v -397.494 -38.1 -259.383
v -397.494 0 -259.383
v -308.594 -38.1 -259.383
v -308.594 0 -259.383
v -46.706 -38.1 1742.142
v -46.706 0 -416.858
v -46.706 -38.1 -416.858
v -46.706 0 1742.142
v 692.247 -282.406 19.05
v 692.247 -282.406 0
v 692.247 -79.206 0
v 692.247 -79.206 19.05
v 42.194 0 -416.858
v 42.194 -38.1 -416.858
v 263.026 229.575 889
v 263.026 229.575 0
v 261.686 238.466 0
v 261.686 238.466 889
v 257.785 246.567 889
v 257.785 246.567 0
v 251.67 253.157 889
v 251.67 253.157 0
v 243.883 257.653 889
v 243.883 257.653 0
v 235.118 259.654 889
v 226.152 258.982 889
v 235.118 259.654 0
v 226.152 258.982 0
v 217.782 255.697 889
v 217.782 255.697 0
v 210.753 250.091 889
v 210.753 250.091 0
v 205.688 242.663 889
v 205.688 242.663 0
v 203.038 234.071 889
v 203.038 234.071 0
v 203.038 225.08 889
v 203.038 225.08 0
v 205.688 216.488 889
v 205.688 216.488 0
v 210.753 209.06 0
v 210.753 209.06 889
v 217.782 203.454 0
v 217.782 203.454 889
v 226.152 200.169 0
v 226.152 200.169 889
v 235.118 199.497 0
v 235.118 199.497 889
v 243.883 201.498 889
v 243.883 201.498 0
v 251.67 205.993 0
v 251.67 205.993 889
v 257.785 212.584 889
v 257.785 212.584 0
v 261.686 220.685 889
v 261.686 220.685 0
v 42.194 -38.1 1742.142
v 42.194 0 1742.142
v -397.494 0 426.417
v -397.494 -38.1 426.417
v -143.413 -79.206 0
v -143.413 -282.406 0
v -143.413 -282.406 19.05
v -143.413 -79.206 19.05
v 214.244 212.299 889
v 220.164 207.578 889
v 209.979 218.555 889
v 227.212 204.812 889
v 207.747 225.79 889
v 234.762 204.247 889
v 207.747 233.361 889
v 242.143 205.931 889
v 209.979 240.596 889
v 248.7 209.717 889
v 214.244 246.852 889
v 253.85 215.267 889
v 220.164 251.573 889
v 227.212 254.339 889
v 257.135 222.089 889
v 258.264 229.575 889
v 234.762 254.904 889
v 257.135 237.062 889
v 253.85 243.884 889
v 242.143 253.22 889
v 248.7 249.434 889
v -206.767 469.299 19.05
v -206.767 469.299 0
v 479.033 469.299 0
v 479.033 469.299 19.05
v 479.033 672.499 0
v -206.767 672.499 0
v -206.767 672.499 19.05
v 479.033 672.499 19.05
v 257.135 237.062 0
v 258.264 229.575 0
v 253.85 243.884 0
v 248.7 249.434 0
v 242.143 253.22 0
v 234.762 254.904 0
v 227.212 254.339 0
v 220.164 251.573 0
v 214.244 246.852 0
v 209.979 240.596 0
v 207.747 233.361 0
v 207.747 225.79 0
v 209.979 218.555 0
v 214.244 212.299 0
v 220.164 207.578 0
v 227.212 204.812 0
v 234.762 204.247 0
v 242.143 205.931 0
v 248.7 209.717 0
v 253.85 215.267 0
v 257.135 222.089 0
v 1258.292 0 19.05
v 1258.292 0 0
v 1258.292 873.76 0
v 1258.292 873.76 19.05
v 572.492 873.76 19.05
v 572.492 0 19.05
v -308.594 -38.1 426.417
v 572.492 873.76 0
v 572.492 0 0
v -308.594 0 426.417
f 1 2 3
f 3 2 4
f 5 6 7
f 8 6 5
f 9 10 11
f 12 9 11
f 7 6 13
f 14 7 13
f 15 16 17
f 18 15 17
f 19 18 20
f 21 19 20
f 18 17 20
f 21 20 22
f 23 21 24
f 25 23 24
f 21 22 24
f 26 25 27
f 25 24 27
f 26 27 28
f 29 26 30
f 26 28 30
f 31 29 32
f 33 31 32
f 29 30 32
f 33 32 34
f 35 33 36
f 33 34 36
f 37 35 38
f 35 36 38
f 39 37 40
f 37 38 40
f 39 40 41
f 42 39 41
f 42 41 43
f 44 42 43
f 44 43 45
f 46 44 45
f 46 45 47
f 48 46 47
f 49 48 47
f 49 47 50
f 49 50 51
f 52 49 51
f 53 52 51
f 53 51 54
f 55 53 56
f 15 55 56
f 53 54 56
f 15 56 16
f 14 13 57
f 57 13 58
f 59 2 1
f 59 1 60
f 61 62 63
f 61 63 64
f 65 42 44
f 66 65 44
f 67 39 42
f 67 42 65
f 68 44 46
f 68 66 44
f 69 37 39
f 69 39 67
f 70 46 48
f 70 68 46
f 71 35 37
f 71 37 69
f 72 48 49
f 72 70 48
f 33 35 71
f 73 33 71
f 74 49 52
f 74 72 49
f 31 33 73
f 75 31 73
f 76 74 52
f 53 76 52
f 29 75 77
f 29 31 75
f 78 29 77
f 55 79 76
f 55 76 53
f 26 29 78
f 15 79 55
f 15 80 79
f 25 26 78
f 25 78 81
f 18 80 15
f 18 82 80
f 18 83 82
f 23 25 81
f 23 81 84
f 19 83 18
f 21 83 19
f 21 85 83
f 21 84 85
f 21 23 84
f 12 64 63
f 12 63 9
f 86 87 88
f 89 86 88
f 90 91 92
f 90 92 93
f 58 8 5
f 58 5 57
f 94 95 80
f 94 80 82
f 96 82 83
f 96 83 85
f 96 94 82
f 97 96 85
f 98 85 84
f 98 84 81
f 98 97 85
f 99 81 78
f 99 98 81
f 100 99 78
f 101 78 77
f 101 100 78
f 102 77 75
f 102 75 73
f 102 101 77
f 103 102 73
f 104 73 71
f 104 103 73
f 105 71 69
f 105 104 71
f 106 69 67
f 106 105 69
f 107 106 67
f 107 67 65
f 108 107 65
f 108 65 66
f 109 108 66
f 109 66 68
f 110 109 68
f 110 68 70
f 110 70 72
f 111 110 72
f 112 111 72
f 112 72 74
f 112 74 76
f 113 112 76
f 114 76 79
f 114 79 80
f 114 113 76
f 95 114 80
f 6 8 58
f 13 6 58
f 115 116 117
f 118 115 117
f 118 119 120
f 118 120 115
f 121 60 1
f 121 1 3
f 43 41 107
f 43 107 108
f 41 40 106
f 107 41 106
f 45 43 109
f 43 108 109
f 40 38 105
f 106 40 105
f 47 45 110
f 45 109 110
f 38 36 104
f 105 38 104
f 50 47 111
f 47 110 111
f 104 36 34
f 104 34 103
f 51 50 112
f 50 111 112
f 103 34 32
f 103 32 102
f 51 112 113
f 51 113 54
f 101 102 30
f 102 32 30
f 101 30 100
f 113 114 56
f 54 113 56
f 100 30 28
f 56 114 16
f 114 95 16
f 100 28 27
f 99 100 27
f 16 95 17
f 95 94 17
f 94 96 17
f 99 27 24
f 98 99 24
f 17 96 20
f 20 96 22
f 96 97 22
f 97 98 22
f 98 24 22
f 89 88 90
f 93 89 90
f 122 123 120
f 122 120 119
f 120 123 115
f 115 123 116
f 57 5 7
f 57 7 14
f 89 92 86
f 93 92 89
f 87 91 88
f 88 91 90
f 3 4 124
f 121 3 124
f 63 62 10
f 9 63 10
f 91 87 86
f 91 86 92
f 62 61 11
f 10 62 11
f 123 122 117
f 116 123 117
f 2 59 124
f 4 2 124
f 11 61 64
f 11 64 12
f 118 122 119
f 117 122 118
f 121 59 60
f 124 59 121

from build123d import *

# Parameters (mm, degrees)
F0_W      = 88.9
F0_H      = 2159
F1_DEPTH  = 38.1
F2_W      = 88.9
F2_H      = 685.8
F3_DEPTH  = 38.1
F4_W      = 685.8
F4_H      = 873.76
F5_DEPTH  = 19.05
F6_W      = 685.8
F6_H      = 203.2
F7_DEPTH  = 19.05
F8_W      = 835.66
F8_H      = 203.2
F9_DEPTH  = 19.05
F10_R     = 30.1625
F10_R_2   = 25.4
F11_DEPTH = 889


with BuildPart() as f1:
    # F0 (on Front) → F1 (new body)
    with BuildSketch(Plane.XZ):
        with Locations((-2.256267, 662.641678)):
            Rectangle(F0_W, F0_H)
    extrude(amount=F1_DEPTH)


with BuildPart() as f3:
    # F2 (on Front) → F3 (new body)
    with BuildSketch(Plane.XZ):
        with Locations((-353.044093, 83.516639)):
            Rectangle(F2_W, F2_H)
    extrude(amount=F3_DEPTH)


with BuildPart() as f5:
    # F4 (on Top) → F5 (new body)
    with BuildSketch(Plane.XY):
        with Locations((915.392447, 436.88)):
            Rectangle(F4_W, F4_H)
    extrude(amount=F5_DEPTH)


with BuildPart() as f7:
    # F6 (on Top) → F7 (new body)
    with BuildSketch(Plane.XY):
        with Locations((136.132513, 570.899233)):
            Rectangle(F6_W, F6_H)
    extrude(amount=F7_DEPTH)


with BuildPart() as f9:
    # F8 (on Top) → F9 (new body)
    with BuildSketch(Plane.XY):
        with Locations((274.416558, -180.806154)):
            Rectangle(F8_W, F8_H)
    extrude(amount=F9_DEPTH)


with BuildPart() as f11:
    # F10 (on Top) → F11 (new body)
    with BuildSketch(Plane.XY):
        with Locations((232.863665, 229.575485)):
            Circle(F10_R)
        with Locations((232.863665, 229.575485)):
            Circle(F10_R_2, mode=Mode.SUBTRACT)
    extrude(amount=F11_DEPTH)


solid = Compound([f1.part, f3.part, f5.part, f7.part, f9.part, f11.part])
